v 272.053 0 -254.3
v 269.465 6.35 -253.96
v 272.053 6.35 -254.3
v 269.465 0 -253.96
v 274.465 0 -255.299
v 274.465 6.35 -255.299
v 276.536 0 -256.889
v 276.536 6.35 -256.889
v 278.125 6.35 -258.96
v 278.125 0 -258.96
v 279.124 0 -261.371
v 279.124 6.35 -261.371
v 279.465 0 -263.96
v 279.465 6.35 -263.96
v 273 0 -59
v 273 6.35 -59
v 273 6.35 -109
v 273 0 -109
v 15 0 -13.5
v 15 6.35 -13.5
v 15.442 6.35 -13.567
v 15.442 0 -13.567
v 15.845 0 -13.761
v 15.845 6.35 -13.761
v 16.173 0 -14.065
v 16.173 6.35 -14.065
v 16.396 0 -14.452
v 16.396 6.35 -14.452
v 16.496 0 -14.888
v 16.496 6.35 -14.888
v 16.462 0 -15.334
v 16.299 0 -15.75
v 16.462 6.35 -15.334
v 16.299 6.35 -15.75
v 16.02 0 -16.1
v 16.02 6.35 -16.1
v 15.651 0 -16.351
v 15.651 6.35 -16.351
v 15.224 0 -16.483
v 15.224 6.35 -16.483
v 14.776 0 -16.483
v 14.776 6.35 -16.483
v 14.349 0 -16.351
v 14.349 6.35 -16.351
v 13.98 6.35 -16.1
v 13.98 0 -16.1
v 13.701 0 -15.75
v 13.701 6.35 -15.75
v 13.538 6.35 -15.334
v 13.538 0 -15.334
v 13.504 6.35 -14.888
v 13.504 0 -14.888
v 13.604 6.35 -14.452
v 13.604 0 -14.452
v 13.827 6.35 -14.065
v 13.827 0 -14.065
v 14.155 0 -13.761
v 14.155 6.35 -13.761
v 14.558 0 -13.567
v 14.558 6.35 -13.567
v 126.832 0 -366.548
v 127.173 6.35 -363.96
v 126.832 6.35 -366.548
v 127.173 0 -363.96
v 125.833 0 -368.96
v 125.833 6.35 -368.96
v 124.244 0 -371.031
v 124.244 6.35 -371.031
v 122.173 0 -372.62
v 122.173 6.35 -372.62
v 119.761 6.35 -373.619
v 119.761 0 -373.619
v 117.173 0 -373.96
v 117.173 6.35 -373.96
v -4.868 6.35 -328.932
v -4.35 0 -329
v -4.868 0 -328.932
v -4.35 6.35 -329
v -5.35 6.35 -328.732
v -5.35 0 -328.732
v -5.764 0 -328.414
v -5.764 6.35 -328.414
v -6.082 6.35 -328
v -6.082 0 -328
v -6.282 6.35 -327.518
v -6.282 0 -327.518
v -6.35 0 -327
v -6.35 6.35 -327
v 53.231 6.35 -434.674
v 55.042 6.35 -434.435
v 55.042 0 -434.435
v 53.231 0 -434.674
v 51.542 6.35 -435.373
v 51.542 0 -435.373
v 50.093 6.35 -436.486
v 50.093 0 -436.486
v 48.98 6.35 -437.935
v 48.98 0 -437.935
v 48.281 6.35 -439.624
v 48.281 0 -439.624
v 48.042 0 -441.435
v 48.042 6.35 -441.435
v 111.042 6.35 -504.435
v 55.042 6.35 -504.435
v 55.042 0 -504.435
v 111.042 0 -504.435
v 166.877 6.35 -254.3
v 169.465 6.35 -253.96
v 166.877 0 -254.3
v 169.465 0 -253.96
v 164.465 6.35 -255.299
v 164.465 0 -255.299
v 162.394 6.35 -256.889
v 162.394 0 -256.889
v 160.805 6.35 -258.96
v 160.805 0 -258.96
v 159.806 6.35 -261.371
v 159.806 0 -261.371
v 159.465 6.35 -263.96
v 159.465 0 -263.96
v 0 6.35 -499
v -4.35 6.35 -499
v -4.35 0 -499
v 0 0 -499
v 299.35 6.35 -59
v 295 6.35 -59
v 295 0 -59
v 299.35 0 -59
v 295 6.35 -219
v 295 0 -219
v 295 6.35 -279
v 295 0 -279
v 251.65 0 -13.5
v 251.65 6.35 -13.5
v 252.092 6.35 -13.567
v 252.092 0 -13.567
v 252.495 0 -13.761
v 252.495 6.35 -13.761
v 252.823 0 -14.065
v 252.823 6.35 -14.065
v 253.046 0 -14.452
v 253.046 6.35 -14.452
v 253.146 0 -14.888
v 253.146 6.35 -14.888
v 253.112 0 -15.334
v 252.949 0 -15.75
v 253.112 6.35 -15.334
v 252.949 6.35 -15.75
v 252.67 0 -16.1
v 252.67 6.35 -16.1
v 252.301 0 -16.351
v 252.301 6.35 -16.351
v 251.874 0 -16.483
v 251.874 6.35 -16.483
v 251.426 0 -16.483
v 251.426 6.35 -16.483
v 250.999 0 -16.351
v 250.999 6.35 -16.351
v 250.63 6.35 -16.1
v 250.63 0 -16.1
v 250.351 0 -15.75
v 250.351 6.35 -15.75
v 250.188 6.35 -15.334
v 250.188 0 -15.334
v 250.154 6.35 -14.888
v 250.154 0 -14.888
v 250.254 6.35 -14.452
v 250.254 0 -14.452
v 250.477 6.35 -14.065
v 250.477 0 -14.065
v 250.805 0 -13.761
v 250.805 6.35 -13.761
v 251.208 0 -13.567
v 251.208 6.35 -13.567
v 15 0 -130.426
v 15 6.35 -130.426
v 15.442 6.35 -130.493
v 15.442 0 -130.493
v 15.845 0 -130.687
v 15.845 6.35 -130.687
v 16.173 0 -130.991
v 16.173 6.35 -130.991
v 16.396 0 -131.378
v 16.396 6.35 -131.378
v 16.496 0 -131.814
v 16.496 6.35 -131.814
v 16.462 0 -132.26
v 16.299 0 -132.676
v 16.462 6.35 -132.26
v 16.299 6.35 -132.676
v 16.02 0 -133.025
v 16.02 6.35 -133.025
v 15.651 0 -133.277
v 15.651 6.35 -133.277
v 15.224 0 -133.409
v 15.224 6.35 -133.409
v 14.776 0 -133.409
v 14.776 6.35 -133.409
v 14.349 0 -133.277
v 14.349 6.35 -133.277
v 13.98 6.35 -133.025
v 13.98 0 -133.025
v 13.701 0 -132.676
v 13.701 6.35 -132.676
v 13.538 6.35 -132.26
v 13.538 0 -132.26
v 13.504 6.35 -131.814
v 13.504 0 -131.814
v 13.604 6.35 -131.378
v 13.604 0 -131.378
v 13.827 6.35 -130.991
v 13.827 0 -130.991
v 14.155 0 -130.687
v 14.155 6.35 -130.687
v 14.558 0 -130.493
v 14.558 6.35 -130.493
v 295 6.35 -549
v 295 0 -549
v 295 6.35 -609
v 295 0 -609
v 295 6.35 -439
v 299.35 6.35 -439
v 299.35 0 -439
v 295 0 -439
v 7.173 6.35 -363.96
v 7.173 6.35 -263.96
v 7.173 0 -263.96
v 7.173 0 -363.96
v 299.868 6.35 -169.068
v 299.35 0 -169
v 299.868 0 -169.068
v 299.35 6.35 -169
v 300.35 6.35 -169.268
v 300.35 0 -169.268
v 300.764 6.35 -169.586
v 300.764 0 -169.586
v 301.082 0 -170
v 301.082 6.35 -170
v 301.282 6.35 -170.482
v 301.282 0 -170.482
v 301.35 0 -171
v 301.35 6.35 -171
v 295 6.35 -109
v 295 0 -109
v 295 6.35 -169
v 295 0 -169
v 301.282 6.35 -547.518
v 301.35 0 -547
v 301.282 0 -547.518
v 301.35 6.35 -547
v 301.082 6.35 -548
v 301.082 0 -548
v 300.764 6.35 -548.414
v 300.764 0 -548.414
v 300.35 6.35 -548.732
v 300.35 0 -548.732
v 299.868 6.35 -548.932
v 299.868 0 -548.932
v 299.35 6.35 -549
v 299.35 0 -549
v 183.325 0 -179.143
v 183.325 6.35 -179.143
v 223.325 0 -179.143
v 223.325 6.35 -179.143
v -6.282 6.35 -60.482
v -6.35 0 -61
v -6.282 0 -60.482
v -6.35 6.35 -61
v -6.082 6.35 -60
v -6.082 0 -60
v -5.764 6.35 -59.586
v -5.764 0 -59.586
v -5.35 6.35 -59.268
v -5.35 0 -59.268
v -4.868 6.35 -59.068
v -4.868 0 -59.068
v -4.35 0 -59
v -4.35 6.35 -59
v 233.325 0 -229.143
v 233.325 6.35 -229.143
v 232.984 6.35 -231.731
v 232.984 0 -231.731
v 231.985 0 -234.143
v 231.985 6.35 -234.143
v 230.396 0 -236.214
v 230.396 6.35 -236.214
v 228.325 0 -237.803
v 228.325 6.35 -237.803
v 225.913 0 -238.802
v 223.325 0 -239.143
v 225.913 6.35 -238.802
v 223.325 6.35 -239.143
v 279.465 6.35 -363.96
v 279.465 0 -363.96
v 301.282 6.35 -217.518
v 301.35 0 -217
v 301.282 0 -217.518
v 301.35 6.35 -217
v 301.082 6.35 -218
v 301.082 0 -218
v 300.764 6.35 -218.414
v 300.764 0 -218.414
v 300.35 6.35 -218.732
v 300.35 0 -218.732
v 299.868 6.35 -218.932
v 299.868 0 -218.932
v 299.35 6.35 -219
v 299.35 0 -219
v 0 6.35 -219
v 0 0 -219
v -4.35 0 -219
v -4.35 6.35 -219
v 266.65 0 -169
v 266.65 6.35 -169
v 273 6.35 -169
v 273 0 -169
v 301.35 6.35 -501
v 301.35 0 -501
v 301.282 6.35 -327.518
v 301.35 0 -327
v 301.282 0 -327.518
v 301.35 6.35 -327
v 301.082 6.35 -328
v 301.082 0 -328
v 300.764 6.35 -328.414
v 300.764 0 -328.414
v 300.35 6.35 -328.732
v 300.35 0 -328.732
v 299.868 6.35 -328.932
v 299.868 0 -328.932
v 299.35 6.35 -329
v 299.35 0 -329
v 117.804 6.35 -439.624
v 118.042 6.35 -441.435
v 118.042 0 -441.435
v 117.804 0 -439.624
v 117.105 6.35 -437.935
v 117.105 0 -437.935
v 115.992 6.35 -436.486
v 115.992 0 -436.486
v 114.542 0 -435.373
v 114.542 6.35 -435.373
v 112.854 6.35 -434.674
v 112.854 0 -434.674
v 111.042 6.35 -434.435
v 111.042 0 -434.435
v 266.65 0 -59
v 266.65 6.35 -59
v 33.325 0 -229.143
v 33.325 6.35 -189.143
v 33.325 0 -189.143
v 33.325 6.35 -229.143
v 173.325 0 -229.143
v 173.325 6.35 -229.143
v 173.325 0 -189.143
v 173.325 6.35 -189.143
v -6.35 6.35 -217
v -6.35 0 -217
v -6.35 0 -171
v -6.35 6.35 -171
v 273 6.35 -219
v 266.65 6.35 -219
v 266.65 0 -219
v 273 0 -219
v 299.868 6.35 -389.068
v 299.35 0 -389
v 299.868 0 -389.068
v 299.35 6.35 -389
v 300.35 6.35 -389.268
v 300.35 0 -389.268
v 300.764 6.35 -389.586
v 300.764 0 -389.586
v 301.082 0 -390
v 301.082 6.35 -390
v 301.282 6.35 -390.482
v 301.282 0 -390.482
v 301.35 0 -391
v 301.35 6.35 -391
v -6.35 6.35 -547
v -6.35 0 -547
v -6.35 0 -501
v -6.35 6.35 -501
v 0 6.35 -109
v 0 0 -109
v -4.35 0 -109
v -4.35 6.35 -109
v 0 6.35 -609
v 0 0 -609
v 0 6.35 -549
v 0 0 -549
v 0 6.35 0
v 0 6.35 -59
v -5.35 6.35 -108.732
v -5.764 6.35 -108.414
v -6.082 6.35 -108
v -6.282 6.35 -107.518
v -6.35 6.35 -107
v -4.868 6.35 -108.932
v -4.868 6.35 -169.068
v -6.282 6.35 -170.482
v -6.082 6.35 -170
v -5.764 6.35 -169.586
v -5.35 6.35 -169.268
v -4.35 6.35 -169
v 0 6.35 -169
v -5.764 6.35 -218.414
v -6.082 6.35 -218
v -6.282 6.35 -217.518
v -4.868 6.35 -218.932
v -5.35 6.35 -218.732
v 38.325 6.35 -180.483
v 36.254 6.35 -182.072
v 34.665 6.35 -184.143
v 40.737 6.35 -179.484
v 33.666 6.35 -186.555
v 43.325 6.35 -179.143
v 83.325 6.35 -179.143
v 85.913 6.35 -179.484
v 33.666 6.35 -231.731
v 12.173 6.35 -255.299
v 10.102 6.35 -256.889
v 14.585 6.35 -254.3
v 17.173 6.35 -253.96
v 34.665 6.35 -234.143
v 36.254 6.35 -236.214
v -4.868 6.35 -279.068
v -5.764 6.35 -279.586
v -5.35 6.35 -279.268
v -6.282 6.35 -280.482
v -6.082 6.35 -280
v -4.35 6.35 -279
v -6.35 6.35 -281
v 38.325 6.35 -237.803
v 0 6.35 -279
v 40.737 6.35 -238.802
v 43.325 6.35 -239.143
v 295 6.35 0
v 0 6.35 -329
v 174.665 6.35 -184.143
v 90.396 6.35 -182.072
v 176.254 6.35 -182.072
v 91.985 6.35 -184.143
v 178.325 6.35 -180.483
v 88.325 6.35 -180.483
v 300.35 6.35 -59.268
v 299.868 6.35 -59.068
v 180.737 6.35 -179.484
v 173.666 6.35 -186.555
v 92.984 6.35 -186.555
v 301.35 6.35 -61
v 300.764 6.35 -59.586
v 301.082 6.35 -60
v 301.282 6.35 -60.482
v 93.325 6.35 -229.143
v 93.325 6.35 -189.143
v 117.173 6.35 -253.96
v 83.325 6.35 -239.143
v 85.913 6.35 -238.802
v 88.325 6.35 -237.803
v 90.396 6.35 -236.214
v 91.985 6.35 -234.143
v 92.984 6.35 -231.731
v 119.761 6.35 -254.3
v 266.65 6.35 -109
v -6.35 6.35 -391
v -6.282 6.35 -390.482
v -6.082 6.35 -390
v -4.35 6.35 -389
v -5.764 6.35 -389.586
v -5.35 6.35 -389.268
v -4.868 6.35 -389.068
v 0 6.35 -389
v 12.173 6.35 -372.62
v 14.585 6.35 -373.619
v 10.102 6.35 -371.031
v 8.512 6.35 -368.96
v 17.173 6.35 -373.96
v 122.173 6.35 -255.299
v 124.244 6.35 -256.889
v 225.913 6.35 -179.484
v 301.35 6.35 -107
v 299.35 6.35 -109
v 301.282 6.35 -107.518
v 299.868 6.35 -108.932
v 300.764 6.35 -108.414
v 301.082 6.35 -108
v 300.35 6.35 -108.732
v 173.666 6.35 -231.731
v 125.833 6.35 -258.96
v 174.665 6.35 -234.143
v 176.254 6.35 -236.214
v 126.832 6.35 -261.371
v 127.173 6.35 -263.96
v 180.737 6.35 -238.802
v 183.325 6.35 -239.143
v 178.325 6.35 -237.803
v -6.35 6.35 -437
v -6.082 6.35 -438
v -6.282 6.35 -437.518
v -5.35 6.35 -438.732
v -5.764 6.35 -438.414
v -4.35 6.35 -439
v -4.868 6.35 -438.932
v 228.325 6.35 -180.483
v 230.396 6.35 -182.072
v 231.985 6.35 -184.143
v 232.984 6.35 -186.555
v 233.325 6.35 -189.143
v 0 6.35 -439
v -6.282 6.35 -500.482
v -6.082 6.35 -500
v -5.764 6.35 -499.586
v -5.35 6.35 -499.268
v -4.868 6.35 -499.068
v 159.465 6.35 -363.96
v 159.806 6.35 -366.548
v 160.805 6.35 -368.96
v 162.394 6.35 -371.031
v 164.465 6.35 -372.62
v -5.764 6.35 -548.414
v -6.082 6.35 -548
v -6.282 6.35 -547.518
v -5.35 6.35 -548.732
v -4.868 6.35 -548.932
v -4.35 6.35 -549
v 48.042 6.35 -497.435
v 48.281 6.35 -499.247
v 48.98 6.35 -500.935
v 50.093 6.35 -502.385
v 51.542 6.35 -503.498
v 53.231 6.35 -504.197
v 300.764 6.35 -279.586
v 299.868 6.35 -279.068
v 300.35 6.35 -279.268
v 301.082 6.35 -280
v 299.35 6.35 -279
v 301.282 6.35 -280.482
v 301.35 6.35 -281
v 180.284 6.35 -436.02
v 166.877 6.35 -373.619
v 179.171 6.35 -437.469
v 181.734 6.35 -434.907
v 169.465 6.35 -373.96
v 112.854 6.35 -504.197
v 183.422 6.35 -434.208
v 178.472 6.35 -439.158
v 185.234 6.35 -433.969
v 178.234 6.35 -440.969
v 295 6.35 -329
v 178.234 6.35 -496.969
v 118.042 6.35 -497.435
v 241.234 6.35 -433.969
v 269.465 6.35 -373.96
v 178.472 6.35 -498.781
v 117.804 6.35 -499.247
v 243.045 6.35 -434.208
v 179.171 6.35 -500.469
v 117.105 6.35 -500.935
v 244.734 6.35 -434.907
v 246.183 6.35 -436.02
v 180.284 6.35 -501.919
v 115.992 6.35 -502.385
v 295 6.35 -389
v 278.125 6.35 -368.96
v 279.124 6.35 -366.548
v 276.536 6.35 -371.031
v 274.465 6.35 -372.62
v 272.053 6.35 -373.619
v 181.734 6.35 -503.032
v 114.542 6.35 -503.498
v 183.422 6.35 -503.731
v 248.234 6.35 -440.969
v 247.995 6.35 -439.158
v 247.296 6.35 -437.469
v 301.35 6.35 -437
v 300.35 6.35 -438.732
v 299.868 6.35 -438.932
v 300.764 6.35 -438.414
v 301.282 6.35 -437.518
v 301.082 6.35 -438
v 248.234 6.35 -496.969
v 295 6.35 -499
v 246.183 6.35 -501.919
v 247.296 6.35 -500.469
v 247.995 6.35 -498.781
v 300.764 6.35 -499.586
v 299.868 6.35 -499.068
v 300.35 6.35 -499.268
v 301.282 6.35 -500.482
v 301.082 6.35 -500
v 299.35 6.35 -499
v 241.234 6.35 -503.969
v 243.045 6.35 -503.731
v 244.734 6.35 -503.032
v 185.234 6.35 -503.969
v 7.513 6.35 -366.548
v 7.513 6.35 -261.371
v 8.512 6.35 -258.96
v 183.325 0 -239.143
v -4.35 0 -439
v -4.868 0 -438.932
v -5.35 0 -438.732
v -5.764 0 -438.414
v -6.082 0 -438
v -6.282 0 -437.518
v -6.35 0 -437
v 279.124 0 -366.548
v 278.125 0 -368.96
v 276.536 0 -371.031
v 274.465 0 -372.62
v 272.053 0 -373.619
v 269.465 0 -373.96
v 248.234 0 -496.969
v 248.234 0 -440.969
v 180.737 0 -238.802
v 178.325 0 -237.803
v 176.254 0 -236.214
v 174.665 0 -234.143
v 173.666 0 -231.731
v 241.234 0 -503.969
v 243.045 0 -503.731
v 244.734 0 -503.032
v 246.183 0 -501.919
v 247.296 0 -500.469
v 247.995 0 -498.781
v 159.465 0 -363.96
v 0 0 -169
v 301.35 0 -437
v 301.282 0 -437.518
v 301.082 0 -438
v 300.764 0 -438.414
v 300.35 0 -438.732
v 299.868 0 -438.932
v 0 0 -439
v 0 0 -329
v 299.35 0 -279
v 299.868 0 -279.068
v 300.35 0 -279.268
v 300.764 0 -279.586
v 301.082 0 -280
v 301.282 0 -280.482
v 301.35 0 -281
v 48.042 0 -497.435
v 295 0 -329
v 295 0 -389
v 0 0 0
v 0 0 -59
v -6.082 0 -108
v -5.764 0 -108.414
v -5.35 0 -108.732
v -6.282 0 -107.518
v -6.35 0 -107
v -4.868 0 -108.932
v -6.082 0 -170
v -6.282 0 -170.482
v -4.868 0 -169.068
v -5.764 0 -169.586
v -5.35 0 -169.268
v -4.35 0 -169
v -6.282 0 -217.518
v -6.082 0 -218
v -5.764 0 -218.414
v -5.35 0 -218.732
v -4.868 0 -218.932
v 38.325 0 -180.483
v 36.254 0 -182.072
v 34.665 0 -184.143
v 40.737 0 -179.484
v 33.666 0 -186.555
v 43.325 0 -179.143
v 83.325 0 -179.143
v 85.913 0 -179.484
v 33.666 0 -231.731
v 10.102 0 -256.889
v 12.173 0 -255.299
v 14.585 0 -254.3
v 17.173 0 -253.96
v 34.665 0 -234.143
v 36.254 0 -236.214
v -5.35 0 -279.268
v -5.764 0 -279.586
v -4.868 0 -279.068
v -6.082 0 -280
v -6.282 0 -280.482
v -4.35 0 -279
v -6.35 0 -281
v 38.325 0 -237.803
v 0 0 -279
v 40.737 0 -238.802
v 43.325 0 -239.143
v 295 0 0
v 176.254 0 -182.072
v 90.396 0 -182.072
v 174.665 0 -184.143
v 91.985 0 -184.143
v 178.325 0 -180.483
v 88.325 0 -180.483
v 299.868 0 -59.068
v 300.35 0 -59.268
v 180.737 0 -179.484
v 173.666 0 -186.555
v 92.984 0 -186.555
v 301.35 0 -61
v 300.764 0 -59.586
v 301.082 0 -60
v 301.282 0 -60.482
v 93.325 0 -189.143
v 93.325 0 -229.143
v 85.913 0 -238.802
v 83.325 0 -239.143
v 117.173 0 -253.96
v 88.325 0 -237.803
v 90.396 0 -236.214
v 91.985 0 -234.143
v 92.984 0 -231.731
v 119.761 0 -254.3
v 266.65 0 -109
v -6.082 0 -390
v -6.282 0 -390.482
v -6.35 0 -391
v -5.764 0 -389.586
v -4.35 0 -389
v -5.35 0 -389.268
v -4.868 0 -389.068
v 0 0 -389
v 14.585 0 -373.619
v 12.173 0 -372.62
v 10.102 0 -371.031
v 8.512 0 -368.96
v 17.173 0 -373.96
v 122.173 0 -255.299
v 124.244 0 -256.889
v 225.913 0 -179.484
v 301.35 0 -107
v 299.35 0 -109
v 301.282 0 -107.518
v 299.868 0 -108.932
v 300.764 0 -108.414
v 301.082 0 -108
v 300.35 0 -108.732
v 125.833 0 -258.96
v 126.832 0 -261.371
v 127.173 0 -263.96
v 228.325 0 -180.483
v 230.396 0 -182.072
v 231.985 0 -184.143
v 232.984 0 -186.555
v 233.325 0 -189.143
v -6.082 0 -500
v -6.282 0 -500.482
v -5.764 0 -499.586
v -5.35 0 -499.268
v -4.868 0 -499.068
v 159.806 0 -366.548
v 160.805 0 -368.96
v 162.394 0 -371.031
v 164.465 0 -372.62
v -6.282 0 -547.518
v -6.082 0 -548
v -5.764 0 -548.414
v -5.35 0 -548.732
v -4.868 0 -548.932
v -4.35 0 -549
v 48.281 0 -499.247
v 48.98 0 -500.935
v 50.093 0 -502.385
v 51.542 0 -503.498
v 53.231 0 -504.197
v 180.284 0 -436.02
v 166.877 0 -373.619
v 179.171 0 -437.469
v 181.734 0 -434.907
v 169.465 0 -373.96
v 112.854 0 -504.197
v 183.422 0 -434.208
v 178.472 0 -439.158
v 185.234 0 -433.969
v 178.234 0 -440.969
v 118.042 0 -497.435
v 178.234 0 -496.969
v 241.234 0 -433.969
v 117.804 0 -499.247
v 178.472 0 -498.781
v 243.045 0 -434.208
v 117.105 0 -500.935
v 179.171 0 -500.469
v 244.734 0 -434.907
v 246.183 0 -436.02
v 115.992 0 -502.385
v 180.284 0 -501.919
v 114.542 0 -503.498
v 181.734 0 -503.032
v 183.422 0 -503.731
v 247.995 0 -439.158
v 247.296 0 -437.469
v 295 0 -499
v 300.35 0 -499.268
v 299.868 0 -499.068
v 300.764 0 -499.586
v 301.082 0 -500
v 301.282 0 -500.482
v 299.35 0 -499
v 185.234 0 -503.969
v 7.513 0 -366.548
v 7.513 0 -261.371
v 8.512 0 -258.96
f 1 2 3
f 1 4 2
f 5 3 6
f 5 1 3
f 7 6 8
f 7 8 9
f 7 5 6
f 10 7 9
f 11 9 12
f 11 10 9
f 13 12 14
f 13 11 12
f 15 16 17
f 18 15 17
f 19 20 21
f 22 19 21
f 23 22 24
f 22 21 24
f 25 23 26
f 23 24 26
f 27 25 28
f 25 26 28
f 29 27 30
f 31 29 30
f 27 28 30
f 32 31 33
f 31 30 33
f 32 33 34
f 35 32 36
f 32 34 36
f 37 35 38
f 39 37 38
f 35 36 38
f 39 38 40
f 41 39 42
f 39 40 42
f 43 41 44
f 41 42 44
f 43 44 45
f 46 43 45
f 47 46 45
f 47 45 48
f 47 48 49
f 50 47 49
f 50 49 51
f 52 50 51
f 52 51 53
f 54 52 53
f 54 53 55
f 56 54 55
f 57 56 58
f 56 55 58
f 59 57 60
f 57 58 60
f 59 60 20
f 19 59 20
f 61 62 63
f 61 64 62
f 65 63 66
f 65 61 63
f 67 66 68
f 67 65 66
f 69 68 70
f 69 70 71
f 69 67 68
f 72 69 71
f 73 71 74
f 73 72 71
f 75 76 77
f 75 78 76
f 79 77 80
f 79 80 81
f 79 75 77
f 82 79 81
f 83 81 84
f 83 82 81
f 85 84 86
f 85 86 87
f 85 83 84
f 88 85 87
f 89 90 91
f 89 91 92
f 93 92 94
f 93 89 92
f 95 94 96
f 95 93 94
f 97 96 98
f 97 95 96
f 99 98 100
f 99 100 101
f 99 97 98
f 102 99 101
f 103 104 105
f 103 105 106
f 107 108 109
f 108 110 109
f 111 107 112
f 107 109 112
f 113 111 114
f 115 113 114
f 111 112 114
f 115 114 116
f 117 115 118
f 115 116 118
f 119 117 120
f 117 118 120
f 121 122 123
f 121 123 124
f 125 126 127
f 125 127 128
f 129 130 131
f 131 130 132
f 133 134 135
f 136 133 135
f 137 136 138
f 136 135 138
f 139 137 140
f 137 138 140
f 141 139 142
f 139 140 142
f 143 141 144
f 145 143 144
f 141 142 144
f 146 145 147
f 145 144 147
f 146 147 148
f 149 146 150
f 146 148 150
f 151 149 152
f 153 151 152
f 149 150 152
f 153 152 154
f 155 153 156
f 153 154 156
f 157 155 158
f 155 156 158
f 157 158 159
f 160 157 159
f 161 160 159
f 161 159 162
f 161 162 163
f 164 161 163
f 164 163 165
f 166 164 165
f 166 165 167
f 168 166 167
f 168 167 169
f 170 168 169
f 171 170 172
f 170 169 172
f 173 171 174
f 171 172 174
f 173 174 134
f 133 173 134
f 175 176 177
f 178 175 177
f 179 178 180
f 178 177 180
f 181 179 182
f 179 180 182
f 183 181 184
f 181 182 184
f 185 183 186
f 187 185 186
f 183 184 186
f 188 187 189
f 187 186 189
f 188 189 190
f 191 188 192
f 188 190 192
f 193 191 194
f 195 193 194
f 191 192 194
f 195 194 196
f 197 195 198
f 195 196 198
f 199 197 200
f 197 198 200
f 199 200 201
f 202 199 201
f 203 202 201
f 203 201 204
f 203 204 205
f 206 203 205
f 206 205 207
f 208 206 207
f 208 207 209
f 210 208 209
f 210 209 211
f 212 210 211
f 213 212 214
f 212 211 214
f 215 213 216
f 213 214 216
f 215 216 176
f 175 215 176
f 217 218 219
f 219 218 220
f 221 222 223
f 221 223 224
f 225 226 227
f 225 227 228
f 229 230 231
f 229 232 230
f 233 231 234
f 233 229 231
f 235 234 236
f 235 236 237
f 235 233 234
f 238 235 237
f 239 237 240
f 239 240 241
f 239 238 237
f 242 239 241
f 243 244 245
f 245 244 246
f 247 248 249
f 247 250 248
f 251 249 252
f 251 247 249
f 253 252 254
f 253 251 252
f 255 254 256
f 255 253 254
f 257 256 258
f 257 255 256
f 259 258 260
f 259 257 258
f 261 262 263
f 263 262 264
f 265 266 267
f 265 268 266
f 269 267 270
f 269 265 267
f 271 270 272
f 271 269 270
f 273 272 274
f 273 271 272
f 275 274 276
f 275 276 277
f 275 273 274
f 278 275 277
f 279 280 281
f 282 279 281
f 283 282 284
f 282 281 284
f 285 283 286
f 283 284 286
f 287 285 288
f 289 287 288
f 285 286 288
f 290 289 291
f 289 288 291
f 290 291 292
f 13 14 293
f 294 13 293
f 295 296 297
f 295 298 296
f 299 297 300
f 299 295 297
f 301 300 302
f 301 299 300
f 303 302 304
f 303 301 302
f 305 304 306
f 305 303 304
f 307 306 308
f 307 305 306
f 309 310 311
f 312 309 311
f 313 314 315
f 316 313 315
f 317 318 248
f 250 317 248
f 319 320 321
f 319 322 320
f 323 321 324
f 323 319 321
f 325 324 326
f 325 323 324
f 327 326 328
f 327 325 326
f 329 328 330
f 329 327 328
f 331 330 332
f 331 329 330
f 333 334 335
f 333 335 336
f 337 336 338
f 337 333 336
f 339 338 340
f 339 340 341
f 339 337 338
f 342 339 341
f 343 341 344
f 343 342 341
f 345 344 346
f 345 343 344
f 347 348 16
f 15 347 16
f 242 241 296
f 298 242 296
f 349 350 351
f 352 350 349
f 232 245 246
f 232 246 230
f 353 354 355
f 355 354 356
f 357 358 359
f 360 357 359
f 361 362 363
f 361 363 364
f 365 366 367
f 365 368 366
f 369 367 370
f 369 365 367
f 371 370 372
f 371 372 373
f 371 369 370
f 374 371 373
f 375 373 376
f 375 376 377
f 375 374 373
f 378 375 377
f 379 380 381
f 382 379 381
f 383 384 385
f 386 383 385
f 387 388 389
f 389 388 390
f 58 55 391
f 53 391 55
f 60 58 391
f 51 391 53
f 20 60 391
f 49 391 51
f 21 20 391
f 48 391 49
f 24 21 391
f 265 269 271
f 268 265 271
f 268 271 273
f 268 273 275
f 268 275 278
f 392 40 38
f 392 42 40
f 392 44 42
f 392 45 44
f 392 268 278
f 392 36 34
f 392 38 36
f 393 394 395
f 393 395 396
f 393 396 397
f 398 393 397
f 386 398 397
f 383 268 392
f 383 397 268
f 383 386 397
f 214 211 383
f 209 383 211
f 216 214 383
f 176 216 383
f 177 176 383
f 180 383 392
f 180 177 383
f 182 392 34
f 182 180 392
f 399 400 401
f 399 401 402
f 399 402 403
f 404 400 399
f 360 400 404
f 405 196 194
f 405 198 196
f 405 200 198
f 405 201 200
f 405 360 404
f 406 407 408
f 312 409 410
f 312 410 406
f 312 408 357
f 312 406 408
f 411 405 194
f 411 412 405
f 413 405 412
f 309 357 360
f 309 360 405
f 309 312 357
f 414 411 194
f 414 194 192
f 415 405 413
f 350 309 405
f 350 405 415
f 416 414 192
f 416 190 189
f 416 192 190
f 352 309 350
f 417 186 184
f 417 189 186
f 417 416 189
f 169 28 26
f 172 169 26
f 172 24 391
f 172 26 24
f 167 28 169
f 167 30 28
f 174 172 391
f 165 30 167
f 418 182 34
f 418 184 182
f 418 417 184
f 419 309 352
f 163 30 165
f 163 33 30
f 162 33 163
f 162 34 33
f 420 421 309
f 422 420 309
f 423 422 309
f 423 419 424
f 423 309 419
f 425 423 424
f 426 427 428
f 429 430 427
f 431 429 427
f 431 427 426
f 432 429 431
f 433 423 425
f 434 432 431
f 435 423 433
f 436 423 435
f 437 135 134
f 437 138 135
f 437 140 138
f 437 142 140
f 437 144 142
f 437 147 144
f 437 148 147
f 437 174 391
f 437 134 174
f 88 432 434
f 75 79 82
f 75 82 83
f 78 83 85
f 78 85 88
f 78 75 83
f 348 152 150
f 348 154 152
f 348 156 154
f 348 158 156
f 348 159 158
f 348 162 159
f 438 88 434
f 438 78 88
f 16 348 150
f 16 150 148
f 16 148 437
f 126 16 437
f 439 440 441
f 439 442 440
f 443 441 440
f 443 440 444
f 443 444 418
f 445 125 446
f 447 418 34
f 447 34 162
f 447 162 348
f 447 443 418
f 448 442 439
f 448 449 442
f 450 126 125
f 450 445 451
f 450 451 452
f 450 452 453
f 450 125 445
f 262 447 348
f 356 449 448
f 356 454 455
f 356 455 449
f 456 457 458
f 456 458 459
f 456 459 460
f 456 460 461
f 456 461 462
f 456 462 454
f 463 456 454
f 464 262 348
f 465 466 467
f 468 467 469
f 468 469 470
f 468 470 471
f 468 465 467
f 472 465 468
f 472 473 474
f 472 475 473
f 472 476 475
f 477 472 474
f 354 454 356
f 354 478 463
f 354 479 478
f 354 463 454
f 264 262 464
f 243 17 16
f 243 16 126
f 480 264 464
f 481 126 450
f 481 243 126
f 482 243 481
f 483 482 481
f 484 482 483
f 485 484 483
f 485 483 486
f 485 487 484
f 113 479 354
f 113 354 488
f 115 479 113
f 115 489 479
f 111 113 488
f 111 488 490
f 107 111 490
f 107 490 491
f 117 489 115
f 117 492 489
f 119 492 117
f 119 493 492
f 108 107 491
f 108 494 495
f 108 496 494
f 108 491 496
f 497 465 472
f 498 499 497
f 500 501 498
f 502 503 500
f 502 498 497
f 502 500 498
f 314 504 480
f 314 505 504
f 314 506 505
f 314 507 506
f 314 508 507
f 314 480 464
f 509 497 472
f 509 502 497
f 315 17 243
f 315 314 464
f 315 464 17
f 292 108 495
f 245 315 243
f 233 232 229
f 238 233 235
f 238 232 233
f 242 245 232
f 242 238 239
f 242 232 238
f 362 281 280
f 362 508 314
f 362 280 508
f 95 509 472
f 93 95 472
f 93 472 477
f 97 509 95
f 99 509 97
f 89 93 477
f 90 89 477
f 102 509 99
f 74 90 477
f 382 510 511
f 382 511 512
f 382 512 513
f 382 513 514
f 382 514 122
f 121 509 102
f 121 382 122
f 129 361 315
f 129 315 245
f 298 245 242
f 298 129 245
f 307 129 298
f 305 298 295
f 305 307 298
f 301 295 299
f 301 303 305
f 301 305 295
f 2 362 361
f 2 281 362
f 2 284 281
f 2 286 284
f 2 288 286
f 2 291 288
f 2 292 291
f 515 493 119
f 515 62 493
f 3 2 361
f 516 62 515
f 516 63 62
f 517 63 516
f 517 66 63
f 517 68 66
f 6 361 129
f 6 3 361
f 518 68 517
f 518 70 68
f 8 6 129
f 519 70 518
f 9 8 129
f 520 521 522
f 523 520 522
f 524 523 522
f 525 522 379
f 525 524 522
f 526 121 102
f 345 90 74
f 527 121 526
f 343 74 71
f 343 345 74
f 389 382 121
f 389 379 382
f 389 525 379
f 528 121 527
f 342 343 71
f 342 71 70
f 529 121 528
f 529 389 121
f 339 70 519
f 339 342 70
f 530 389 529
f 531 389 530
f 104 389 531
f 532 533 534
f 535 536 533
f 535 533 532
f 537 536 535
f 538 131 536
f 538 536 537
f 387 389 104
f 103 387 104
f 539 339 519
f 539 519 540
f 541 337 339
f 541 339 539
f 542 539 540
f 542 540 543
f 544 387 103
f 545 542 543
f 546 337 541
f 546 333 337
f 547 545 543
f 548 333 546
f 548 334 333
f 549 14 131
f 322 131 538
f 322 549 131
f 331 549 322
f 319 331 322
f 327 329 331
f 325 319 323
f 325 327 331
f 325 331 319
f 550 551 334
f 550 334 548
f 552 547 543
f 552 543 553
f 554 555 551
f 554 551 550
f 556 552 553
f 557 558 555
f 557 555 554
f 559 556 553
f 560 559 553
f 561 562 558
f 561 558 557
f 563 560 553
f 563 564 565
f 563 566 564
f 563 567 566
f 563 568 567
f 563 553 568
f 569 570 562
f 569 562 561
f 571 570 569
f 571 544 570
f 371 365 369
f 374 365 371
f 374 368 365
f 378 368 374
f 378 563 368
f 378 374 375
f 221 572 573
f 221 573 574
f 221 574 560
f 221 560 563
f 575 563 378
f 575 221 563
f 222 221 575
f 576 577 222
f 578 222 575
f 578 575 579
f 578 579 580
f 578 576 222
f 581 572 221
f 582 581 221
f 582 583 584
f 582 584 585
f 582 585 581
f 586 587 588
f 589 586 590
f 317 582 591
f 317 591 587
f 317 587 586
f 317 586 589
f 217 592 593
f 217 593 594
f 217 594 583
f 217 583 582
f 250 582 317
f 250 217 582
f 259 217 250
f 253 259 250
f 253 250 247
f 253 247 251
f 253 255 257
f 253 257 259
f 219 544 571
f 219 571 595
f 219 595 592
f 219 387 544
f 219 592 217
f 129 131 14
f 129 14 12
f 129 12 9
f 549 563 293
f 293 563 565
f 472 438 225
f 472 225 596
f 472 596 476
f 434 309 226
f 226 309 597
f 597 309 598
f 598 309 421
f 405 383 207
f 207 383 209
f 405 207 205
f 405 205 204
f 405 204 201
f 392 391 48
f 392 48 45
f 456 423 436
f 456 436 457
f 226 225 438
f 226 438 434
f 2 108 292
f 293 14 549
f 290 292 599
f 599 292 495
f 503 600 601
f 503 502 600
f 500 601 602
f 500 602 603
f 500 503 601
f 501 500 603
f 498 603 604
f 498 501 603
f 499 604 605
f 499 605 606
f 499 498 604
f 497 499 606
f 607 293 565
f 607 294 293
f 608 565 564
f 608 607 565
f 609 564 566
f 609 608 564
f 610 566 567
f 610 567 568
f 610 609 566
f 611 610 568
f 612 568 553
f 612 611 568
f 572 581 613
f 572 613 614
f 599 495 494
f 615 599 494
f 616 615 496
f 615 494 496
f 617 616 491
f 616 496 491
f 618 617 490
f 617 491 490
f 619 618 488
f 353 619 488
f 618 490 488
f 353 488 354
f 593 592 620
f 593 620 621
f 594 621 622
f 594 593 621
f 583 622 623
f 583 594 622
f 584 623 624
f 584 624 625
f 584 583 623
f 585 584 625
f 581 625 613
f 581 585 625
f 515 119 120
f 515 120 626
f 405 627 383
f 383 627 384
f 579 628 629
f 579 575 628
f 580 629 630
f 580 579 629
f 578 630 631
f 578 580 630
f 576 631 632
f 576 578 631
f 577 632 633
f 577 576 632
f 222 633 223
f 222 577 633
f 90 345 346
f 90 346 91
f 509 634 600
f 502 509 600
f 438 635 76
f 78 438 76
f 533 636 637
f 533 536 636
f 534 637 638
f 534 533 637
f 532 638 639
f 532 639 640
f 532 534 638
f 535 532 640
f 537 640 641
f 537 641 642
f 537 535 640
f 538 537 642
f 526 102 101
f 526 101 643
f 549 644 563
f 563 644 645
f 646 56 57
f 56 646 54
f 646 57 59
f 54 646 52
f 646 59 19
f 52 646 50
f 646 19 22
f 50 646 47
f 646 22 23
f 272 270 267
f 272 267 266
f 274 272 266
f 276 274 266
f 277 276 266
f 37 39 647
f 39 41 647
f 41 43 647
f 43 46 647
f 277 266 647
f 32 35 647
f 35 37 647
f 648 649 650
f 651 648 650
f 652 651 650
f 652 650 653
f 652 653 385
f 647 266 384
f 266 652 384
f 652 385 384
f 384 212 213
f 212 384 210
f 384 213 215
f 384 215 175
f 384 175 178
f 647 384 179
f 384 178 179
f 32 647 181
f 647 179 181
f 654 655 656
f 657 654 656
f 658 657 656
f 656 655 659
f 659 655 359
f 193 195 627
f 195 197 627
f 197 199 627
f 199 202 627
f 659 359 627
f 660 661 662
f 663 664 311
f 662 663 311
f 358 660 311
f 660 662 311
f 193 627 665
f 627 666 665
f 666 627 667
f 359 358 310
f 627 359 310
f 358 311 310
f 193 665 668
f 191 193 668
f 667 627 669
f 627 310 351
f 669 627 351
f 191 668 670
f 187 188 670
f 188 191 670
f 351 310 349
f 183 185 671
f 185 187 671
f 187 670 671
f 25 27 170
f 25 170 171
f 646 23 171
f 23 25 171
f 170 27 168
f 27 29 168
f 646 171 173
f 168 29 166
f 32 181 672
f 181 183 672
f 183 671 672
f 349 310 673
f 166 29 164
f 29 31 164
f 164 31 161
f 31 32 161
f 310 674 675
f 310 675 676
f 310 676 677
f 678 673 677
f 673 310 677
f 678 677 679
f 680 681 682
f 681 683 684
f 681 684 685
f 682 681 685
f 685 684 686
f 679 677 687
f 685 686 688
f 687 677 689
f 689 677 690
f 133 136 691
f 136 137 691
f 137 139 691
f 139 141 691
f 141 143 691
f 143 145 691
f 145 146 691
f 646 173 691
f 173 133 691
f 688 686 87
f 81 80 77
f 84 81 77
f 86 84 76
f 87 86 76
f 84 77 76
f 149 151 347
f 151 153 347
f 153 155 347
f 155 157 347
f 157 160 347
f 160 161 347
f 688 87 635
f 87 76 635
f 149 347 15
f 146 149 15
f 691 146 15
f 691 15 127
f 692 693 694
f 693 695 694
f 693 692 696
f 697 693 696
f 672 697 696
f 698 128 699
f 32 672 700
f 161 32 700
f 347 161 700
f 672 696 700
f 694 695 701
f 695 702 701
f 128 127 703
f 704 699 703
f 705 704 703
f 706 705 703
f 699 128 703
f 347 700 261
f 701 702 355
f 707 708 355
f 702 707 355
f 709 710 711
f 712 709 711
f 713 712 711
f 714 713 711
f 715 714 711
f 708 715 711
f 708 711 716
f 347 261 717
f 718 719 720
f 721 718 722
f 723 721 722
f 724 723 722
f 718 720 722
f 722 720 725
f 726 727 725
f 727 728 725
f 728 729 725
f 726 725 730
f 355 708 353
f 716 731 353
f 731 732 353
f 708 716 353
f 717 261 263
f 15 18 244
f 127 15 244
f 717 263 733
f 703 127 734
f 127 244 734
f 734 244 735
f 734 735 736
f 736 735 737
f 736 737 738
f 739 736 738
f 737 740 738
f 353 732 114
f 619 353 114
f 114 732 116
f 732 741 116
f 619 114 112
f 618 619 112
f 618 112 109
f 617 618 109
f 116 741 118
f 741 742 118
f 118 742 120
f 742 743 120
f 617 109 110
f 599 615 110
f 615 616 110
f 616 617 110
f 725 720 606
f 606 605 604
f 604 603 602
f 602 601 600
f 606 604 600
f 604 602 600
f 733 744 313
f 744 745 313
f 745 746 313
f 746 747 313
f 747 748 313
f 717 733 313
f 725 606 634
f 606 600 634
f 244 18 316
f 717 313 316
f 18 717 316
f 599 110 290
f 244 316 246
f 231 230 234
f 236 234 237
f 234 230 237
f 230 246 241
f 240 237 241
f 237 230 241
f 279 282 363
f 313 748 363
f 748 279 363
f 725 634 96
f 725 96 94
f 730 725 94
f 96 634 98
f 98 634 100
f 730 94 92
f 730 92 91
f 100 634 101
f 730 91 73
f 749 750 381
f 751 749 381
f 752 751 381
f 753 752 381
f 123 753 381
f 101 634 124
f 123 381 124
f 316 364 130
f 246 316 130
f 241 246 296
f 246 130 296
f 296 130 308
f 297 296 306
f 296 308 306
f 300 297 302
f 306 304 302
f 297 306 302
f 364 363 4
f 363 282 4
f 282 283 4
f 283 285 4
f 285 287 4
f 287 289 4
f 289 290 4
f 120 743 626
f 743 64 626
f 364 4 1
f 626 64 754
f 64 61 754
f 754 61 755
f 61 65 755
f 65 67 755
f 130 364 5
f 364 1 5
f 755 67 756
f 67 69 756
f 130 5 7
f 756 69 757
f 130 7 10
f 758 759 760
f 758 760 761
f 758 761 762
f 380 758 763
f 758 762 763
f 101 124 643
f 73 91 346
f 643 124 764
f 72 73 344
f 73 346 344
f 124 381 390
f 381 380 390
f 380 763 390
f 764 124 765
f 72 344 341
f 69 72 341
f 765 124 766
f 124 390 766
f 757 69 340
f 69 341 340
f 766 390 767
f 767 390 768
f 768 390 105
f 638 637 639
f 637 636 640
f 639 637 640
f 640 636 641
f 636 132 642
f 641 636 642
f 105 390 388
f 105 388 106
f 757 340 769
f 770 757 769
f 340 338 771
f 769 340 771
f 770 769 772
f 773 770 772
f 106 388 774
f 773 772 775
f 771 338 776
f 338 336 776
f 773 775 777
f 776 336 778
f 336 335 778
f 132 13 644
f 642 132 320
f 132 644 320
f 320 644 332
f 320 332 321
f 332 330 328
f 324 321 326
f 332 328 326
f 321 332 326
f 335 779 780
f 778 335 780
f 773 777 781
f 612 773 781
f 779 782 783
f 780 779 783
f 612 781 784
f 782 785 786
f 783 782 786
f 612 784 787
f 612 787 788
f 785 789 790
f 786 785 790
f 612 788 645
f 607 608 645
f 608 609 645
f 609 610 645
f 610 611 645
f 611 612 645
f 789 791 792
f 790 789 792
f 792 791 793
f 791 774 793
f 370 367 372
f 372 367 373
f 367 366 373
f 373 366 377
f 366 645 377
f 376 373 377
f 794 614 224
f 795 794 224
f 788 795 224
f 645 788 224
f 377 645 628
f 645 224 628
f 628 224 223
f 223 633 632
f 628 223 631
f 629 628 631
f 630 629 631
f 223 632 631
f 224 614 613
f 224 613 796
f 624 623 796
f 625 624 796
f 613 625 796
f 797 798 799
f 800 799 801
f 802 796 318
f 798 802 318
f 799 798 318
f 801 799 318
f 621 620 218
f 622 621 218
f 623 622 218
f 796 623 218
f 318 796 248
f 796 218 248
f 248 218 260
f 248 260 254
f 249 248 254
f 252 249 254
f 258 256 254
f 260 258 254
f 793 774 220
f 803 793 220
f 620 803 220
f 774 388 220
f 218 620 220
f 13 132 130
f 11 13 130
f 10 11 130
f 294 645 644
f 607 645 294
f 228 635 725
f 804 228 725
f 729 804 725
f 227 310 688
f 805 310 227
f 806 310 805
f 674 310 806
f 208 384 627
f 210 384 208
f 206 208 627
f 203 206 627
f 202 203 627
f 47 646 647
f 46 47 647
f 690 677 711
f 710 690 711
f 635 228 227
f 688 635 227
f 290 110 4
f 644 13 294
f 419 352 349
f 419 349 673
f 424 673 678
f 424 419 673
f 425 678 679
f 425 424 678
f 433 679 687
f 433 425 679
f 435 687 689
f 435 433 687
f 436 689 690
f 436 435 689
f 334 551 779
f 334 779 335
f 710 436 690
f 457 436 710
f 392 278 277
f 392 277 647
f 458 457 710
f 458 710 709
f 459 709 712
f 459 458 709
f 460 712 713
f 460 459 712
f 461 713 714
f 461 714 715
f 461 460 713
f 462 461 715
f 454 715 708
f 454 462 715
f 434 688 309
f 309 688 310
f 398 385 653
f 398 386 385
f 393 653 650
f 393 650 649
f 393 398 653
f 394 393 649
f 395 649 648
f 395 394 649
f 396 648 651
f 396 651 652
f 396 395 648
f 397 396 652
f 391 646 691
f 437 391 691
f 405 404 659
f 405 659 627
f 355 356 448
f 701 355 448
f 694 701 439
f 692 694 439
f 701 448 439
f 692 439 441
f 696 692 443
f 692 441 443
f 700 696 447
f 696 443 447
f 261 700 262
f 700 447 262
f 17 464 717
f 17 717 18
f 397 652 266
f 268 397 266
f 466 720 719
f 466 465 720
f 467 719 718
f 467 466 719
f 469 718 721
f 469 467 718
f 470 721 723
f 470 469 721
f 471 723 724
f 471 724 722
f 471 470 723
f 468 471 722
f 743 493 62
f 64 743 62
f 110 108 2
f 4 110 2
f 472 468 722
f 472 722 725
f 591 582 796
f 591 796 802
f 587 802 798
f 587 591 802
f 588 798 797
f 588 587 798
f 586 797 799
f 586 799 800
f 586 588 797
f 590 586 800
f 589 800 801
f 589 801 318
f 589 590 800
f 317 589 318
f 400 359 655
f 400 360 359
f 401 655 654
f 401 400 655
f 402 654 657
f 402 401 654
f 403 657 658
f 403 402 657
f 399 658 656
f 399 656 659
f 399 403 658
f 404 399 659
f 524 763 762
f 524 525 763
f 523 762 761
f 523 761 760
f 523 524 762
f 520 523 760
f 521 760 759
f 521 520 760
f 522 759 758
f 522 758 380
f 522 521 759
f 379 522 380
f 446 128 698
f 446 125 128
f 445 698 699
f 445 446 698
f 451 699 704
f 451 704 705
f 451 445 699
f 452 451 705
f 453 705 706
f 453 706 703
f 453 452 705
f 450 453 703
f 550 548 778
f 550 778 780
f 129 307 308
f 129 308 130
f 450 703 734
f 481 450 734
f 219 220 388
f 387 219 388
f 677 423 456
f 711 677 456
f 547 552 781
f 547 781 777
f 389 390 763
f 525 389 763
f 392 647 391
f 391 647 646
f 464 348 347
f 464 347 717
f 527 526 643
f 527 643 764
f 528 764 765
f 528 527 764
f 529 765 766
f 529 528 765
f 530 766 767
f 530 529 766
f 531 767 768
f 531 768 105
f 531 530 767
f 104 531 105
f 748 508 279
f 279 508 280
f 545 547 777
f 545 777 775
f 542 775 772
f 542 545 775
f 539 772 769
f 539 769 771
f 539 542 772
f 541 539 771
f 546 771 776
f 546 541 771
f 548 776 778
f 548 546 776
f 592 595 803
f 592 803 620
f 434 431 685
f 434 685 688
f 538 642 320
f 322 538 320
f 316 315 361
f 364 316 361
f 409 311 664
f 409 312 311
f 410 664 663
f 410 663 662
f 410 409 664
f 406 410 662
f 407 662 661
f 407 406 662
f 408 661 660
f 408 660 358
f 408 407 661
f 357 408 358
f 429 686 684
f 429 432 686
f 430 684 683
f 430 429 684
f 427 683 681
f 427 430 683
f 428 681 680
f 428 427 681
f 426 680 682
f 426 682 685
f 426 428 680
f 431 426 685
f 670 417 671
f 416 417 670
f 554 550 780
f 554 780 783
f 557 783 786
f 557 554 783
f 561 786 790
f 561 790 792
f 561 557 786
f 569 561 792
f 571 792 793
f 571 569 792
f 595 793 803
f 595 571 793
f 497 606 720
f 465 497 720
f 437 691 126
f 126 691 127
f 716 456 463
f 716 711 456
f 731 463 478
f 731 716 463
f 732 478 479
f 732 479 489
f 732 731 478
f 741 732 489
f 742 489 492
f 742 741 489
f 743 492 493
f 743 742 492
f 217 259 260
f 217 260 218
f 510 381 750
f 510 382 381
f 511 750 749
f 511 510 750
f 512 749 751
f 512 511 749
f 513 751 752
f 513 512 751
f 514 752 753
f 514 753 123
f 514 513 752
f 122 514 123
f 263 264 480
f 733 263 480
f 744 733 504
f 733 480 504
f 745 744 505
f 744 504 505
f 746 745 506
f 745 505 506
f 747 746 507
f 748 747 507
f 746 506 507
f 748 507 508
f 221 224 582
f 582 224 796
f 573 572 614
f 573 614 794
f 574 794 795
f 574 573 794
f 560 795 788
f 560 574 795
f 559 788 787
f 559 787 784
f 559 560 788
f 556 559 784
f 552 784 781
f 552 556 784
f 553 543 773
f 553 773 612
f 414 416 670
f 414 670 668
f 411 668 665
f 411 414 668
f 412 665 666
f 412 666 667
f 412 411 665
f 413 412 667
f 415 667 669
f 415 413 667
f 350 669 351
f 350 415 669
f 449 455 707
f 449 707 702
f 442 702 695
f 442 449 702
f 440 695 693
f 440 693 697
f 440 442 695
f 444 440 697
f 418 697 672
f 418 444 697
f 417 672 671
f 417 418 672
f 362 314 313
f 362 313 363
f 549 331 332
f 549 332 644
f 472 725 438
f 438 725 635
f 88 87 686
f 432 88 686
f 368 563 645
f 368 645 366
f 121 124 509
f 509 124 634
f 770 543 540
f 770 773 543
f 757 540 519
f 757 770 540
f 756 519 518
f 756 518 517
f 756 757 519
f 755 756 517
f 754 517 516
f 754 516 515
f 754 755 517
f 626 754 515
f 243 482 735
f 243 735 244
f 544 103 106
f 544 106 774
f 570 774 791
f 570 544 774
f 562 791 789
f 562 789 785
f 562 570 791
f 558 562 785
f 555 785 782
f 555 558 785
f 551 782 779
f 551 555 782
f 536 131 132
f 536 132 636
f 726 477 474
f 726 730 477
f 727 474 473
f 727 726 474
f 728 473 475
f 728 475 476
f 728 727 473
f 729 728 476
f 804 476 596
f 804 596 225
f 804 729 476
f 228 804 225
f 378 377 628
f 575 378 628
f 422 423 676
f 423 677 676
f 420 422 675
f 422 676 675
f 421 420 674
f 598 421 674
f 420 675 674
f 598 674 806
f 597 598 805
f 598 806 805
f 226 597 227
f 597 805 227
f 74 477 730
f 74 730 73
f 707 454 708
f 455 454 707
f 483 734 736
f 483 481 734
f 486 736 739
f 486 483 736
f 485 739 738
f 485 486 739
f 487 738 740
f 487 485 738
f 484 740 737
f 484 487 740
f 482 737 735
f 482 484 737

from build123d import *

# Parameters (mm, degrees)
BOSS_EXTRUDE1_DEPTH = 6.35
FILLET1_R           = 2
SKETCH2_R           = 1.5
SKETCH2_W           = 6.35
SKETCH2_H           = 50
SKETCH2_W_2         = 120
SKETCH2_H_2         = 120
CUT_EXTRUDE1_DEPTH  = 6.35
FILLET2_R           = 10


with BuildPart() as part:
    # Sketch1 → Boss-Extrude1 (new body)
    with BuildSketch(Plane(origin=(0, 0, 0), x_dir=(1, 0, 0), z_dir=(0, 1, 0))):
        Polygon((0, 0), (295, 0), (295, 59), (301.35, 59), (301.35, 109), (295, 109), (295, 169), (301.35, 169), (301.35, 219), (295, 219), (295, 279), (301.35, 279), (301.35, 329), (295, 329), (295, 389), (301.35, 389), (301.35, 439), (295, 439), (295, 499), (301.35, 499), (301.35, 549), (295, 549), (295, 609), (0, 609), (0, 549), (-6.35, 549), (-6.35, 499), (0, 499), (0, 439), (-6.35, 439), (-6.35, 389), (0, 389), (0, 329), (-6.35, 329), (-6.35, 279), (0, 279), (0, 219), (-6.35, 219), (-6.35, 169), (0, 169), (0, 109), (-6.35, 109), (-6.35, 59), (0, 59), align=None)
    extrude(amount=BOSS_EXTRUDE1_DEPTH)

    # Fillet1
    fillet1_edges = [part.edges().sort_by_distance(p)[0] for p in [
        (-6.35, 3.175, -59),
        (-6.35, 3.175, -109),
        (-6.35, 3.175, -169),
        (-6.35, 3.175, -219),
        (-6.35, 3.175, -279),
        (-6.35, 3.175, -329),
        (-6.35, 3.175, -389),
        (-6.35, 3.175, -439),
        (-6.35, 3.175, -499),
        (-6.35, 3.175, -549),
        (301.35, 3.175, -549),
        (301.35, 3.175, -499),
        (301.35, 3.175, -439),
        (301.35, 3.175, -389),
        (301.35, 3.175, -329),
        (301.35, 3.175, -279),
        (301.35, 3.175, -219),
        (301.35, 3.175, -169),
        (301.35, 3.175, -109),
        (301.35, 3.175, -59),
    ]]
    fillet(fillet1_edges, radius=FILLET1_R)

    # Sketch2 → Cut-Extrude1 (cut)
    with BuildSketch(Plane(origin=(0, 6.35, 0), x_dir=(1, 0, 0), z_dir=(0, 1, 0))):
        with Locations(Location((15, 15, 0), (0, 0, 270))):
            Circle(SKETCH2_R)
        with Locations(Location((251.65, 15, 0), (0, 0, 270))):
            Circle(SKETCH2_R)
        with Locations(Location((15, 131.925897501, 0), (0, 0, 270))):
            Circle(SKETCH2_R)
        with Locations((269.825, 194)):
            Rectangle(SKETCH2_W, SKETCH2_H)
        with Locations((269.825, 84)):
            Rectangle(SKETCH2_W, SKETCH2_H)
        with BuildLine():
            Line((55.042435698, 504.435466218), (111.042435698, 504.435466218))
            ThreePointArc((111.042435698, 504.435466218), (115.992183166, 502.385213686), (118.042435698, 497.435466218))
            Line((118.042435698, 497.435466218), (118.042435698, 441.435466218))
            ThreePointArc((118.042435698, 441.435466218), (115.992183166, 436.48571875), (111.042435698, 434.435466218))
            Line((111.042435698, 434.435466218), (55.042435698, 434.435466218))
            ThreePointArc((55.042435698, 434.435466218), (50.09268823, 436.48571875), (48.042435698, 441.435466218))
            Line((48.042435698, 441.435466218), (48.042435698, 497.435466218))
            ThreePointArc((48.042435698, 497.435466218), (50.09268823, 502.385213686), (55.042435698, 504.435466218))
        make_face()
        with BuildLine():
            Line((185.233522799, 503.969461472), (241.233522799, 503.969461472))
            ThreePointArc((241.233522799, 503.969461472), (246.183270267, 501.91920894), (248.233522799, 496.969461472))
            Line((248.233522799, 496.969461472), (248.233522799, 440.969461472))
            ThreePointArc((248.233522799, 440.969461472), (246.183270267, 436.019714004), (241.233522799, 433.969461472))
            Line((241.233522799, 433.969461472), (185.233522799, 433.969461472))
            ThreePointArc((185.233522799, 433.969461472), (180.283775331, 436.019714004), (178.233522799, 440.969461472))
            Line((178.233522799, 440.969461472), (178.233522799, 496.969461472))
            ThreePointArc((178.233522799, 496.969461472), (180.283775331, 501.91920894), (185.233522799, 503.969461472))
        make_face()
        with BuildLine():
            Line((43.325, 239.143159068), (83.325, 239.143159068))
            ThreePointArc((83.325, 239.143159068), (90.396067812, 236.21422688), (93.325, 229.143159068))
            Line((93.325, 229.143159068), (93.325, 189.143159068))
            ThreePointArc((93.325, 189.143159068), (90.396067812, 182.072091256), (83.325, 179.143159068))
            Line((83.325, 179.143159068), (43.325, 179.143159068))
            ThreePointArc((43.325, 179.143159068), (36.253932188, 182.072091256), (33.325, 189.143159068))
            Line((33.325, 189.143159068), (33.325, 229.143159068))
            ThreePointArc((33.325, 229.143159068), (36.253932188, 236.21422688), (43.325, 239.143159068))
        make_face()
        with Locations((67.172717051, 313.959589149)):
            Rectangle(SKETCH2_W_2, SKETCH2_H_2)
        with Locations((219.464803824, 313.959589149)):
            Rectangle(SKETCH2_W_2, SKETCH2_H_2)
        with BuildLine():
            Line((173.325, 229.143159068), (173.325, 189.143159068))
            ThreePointArc((173.325, 189.143159068), (176.253932188, 182.072091256), (183.325, 179.143159068))
            Line((183.325, 179.143159068), (223.325, 179.143159068))
            ThreePointArc((223.325, 179.143159068), (230.396067812, 182.072091256), (233.325, 189.143159068))
            Line((233.325, 189.143159068), (233.325, 229.143159068))
            ThreePointArc((233.325, 229.143159068), (230.396067812, 236.21422688), (223.325, 239.143159068))
            Line((223.325, 239.143159068), (183.325, 239.143159068))
            ThreePointArc((183.325, 239.143159068), (176.253932188, 236.21422688), (173.325, 229.143159068))
        make_face()
    extrude(amount=-CUT_EXTRUDE1_DEPTH, mode=Mode.SUBTRACT)

    # Fillet2
    fillet2_edges = [part.edges().sort_by_distance(p)[0] for p in [
        (7.172717051, 3.175, -253.959589149),
        (7.172717051, 3.175, -373.959589149),
        (127.172717051, 3.175, -373.959589149),
        (127.172717051, 3.175, -253.959589149),
        (159.464803824, 3.175, -253.959589149),
        (159.464803824, 3.175, -373.959589149),
        (279.464803824, 3.175, -373.959589149),
        (279.464803824, 3.175, -253.959589149),
    ]]
    fillet(fillet2_edges, radius=FILLET2_R)


solid = part.part
